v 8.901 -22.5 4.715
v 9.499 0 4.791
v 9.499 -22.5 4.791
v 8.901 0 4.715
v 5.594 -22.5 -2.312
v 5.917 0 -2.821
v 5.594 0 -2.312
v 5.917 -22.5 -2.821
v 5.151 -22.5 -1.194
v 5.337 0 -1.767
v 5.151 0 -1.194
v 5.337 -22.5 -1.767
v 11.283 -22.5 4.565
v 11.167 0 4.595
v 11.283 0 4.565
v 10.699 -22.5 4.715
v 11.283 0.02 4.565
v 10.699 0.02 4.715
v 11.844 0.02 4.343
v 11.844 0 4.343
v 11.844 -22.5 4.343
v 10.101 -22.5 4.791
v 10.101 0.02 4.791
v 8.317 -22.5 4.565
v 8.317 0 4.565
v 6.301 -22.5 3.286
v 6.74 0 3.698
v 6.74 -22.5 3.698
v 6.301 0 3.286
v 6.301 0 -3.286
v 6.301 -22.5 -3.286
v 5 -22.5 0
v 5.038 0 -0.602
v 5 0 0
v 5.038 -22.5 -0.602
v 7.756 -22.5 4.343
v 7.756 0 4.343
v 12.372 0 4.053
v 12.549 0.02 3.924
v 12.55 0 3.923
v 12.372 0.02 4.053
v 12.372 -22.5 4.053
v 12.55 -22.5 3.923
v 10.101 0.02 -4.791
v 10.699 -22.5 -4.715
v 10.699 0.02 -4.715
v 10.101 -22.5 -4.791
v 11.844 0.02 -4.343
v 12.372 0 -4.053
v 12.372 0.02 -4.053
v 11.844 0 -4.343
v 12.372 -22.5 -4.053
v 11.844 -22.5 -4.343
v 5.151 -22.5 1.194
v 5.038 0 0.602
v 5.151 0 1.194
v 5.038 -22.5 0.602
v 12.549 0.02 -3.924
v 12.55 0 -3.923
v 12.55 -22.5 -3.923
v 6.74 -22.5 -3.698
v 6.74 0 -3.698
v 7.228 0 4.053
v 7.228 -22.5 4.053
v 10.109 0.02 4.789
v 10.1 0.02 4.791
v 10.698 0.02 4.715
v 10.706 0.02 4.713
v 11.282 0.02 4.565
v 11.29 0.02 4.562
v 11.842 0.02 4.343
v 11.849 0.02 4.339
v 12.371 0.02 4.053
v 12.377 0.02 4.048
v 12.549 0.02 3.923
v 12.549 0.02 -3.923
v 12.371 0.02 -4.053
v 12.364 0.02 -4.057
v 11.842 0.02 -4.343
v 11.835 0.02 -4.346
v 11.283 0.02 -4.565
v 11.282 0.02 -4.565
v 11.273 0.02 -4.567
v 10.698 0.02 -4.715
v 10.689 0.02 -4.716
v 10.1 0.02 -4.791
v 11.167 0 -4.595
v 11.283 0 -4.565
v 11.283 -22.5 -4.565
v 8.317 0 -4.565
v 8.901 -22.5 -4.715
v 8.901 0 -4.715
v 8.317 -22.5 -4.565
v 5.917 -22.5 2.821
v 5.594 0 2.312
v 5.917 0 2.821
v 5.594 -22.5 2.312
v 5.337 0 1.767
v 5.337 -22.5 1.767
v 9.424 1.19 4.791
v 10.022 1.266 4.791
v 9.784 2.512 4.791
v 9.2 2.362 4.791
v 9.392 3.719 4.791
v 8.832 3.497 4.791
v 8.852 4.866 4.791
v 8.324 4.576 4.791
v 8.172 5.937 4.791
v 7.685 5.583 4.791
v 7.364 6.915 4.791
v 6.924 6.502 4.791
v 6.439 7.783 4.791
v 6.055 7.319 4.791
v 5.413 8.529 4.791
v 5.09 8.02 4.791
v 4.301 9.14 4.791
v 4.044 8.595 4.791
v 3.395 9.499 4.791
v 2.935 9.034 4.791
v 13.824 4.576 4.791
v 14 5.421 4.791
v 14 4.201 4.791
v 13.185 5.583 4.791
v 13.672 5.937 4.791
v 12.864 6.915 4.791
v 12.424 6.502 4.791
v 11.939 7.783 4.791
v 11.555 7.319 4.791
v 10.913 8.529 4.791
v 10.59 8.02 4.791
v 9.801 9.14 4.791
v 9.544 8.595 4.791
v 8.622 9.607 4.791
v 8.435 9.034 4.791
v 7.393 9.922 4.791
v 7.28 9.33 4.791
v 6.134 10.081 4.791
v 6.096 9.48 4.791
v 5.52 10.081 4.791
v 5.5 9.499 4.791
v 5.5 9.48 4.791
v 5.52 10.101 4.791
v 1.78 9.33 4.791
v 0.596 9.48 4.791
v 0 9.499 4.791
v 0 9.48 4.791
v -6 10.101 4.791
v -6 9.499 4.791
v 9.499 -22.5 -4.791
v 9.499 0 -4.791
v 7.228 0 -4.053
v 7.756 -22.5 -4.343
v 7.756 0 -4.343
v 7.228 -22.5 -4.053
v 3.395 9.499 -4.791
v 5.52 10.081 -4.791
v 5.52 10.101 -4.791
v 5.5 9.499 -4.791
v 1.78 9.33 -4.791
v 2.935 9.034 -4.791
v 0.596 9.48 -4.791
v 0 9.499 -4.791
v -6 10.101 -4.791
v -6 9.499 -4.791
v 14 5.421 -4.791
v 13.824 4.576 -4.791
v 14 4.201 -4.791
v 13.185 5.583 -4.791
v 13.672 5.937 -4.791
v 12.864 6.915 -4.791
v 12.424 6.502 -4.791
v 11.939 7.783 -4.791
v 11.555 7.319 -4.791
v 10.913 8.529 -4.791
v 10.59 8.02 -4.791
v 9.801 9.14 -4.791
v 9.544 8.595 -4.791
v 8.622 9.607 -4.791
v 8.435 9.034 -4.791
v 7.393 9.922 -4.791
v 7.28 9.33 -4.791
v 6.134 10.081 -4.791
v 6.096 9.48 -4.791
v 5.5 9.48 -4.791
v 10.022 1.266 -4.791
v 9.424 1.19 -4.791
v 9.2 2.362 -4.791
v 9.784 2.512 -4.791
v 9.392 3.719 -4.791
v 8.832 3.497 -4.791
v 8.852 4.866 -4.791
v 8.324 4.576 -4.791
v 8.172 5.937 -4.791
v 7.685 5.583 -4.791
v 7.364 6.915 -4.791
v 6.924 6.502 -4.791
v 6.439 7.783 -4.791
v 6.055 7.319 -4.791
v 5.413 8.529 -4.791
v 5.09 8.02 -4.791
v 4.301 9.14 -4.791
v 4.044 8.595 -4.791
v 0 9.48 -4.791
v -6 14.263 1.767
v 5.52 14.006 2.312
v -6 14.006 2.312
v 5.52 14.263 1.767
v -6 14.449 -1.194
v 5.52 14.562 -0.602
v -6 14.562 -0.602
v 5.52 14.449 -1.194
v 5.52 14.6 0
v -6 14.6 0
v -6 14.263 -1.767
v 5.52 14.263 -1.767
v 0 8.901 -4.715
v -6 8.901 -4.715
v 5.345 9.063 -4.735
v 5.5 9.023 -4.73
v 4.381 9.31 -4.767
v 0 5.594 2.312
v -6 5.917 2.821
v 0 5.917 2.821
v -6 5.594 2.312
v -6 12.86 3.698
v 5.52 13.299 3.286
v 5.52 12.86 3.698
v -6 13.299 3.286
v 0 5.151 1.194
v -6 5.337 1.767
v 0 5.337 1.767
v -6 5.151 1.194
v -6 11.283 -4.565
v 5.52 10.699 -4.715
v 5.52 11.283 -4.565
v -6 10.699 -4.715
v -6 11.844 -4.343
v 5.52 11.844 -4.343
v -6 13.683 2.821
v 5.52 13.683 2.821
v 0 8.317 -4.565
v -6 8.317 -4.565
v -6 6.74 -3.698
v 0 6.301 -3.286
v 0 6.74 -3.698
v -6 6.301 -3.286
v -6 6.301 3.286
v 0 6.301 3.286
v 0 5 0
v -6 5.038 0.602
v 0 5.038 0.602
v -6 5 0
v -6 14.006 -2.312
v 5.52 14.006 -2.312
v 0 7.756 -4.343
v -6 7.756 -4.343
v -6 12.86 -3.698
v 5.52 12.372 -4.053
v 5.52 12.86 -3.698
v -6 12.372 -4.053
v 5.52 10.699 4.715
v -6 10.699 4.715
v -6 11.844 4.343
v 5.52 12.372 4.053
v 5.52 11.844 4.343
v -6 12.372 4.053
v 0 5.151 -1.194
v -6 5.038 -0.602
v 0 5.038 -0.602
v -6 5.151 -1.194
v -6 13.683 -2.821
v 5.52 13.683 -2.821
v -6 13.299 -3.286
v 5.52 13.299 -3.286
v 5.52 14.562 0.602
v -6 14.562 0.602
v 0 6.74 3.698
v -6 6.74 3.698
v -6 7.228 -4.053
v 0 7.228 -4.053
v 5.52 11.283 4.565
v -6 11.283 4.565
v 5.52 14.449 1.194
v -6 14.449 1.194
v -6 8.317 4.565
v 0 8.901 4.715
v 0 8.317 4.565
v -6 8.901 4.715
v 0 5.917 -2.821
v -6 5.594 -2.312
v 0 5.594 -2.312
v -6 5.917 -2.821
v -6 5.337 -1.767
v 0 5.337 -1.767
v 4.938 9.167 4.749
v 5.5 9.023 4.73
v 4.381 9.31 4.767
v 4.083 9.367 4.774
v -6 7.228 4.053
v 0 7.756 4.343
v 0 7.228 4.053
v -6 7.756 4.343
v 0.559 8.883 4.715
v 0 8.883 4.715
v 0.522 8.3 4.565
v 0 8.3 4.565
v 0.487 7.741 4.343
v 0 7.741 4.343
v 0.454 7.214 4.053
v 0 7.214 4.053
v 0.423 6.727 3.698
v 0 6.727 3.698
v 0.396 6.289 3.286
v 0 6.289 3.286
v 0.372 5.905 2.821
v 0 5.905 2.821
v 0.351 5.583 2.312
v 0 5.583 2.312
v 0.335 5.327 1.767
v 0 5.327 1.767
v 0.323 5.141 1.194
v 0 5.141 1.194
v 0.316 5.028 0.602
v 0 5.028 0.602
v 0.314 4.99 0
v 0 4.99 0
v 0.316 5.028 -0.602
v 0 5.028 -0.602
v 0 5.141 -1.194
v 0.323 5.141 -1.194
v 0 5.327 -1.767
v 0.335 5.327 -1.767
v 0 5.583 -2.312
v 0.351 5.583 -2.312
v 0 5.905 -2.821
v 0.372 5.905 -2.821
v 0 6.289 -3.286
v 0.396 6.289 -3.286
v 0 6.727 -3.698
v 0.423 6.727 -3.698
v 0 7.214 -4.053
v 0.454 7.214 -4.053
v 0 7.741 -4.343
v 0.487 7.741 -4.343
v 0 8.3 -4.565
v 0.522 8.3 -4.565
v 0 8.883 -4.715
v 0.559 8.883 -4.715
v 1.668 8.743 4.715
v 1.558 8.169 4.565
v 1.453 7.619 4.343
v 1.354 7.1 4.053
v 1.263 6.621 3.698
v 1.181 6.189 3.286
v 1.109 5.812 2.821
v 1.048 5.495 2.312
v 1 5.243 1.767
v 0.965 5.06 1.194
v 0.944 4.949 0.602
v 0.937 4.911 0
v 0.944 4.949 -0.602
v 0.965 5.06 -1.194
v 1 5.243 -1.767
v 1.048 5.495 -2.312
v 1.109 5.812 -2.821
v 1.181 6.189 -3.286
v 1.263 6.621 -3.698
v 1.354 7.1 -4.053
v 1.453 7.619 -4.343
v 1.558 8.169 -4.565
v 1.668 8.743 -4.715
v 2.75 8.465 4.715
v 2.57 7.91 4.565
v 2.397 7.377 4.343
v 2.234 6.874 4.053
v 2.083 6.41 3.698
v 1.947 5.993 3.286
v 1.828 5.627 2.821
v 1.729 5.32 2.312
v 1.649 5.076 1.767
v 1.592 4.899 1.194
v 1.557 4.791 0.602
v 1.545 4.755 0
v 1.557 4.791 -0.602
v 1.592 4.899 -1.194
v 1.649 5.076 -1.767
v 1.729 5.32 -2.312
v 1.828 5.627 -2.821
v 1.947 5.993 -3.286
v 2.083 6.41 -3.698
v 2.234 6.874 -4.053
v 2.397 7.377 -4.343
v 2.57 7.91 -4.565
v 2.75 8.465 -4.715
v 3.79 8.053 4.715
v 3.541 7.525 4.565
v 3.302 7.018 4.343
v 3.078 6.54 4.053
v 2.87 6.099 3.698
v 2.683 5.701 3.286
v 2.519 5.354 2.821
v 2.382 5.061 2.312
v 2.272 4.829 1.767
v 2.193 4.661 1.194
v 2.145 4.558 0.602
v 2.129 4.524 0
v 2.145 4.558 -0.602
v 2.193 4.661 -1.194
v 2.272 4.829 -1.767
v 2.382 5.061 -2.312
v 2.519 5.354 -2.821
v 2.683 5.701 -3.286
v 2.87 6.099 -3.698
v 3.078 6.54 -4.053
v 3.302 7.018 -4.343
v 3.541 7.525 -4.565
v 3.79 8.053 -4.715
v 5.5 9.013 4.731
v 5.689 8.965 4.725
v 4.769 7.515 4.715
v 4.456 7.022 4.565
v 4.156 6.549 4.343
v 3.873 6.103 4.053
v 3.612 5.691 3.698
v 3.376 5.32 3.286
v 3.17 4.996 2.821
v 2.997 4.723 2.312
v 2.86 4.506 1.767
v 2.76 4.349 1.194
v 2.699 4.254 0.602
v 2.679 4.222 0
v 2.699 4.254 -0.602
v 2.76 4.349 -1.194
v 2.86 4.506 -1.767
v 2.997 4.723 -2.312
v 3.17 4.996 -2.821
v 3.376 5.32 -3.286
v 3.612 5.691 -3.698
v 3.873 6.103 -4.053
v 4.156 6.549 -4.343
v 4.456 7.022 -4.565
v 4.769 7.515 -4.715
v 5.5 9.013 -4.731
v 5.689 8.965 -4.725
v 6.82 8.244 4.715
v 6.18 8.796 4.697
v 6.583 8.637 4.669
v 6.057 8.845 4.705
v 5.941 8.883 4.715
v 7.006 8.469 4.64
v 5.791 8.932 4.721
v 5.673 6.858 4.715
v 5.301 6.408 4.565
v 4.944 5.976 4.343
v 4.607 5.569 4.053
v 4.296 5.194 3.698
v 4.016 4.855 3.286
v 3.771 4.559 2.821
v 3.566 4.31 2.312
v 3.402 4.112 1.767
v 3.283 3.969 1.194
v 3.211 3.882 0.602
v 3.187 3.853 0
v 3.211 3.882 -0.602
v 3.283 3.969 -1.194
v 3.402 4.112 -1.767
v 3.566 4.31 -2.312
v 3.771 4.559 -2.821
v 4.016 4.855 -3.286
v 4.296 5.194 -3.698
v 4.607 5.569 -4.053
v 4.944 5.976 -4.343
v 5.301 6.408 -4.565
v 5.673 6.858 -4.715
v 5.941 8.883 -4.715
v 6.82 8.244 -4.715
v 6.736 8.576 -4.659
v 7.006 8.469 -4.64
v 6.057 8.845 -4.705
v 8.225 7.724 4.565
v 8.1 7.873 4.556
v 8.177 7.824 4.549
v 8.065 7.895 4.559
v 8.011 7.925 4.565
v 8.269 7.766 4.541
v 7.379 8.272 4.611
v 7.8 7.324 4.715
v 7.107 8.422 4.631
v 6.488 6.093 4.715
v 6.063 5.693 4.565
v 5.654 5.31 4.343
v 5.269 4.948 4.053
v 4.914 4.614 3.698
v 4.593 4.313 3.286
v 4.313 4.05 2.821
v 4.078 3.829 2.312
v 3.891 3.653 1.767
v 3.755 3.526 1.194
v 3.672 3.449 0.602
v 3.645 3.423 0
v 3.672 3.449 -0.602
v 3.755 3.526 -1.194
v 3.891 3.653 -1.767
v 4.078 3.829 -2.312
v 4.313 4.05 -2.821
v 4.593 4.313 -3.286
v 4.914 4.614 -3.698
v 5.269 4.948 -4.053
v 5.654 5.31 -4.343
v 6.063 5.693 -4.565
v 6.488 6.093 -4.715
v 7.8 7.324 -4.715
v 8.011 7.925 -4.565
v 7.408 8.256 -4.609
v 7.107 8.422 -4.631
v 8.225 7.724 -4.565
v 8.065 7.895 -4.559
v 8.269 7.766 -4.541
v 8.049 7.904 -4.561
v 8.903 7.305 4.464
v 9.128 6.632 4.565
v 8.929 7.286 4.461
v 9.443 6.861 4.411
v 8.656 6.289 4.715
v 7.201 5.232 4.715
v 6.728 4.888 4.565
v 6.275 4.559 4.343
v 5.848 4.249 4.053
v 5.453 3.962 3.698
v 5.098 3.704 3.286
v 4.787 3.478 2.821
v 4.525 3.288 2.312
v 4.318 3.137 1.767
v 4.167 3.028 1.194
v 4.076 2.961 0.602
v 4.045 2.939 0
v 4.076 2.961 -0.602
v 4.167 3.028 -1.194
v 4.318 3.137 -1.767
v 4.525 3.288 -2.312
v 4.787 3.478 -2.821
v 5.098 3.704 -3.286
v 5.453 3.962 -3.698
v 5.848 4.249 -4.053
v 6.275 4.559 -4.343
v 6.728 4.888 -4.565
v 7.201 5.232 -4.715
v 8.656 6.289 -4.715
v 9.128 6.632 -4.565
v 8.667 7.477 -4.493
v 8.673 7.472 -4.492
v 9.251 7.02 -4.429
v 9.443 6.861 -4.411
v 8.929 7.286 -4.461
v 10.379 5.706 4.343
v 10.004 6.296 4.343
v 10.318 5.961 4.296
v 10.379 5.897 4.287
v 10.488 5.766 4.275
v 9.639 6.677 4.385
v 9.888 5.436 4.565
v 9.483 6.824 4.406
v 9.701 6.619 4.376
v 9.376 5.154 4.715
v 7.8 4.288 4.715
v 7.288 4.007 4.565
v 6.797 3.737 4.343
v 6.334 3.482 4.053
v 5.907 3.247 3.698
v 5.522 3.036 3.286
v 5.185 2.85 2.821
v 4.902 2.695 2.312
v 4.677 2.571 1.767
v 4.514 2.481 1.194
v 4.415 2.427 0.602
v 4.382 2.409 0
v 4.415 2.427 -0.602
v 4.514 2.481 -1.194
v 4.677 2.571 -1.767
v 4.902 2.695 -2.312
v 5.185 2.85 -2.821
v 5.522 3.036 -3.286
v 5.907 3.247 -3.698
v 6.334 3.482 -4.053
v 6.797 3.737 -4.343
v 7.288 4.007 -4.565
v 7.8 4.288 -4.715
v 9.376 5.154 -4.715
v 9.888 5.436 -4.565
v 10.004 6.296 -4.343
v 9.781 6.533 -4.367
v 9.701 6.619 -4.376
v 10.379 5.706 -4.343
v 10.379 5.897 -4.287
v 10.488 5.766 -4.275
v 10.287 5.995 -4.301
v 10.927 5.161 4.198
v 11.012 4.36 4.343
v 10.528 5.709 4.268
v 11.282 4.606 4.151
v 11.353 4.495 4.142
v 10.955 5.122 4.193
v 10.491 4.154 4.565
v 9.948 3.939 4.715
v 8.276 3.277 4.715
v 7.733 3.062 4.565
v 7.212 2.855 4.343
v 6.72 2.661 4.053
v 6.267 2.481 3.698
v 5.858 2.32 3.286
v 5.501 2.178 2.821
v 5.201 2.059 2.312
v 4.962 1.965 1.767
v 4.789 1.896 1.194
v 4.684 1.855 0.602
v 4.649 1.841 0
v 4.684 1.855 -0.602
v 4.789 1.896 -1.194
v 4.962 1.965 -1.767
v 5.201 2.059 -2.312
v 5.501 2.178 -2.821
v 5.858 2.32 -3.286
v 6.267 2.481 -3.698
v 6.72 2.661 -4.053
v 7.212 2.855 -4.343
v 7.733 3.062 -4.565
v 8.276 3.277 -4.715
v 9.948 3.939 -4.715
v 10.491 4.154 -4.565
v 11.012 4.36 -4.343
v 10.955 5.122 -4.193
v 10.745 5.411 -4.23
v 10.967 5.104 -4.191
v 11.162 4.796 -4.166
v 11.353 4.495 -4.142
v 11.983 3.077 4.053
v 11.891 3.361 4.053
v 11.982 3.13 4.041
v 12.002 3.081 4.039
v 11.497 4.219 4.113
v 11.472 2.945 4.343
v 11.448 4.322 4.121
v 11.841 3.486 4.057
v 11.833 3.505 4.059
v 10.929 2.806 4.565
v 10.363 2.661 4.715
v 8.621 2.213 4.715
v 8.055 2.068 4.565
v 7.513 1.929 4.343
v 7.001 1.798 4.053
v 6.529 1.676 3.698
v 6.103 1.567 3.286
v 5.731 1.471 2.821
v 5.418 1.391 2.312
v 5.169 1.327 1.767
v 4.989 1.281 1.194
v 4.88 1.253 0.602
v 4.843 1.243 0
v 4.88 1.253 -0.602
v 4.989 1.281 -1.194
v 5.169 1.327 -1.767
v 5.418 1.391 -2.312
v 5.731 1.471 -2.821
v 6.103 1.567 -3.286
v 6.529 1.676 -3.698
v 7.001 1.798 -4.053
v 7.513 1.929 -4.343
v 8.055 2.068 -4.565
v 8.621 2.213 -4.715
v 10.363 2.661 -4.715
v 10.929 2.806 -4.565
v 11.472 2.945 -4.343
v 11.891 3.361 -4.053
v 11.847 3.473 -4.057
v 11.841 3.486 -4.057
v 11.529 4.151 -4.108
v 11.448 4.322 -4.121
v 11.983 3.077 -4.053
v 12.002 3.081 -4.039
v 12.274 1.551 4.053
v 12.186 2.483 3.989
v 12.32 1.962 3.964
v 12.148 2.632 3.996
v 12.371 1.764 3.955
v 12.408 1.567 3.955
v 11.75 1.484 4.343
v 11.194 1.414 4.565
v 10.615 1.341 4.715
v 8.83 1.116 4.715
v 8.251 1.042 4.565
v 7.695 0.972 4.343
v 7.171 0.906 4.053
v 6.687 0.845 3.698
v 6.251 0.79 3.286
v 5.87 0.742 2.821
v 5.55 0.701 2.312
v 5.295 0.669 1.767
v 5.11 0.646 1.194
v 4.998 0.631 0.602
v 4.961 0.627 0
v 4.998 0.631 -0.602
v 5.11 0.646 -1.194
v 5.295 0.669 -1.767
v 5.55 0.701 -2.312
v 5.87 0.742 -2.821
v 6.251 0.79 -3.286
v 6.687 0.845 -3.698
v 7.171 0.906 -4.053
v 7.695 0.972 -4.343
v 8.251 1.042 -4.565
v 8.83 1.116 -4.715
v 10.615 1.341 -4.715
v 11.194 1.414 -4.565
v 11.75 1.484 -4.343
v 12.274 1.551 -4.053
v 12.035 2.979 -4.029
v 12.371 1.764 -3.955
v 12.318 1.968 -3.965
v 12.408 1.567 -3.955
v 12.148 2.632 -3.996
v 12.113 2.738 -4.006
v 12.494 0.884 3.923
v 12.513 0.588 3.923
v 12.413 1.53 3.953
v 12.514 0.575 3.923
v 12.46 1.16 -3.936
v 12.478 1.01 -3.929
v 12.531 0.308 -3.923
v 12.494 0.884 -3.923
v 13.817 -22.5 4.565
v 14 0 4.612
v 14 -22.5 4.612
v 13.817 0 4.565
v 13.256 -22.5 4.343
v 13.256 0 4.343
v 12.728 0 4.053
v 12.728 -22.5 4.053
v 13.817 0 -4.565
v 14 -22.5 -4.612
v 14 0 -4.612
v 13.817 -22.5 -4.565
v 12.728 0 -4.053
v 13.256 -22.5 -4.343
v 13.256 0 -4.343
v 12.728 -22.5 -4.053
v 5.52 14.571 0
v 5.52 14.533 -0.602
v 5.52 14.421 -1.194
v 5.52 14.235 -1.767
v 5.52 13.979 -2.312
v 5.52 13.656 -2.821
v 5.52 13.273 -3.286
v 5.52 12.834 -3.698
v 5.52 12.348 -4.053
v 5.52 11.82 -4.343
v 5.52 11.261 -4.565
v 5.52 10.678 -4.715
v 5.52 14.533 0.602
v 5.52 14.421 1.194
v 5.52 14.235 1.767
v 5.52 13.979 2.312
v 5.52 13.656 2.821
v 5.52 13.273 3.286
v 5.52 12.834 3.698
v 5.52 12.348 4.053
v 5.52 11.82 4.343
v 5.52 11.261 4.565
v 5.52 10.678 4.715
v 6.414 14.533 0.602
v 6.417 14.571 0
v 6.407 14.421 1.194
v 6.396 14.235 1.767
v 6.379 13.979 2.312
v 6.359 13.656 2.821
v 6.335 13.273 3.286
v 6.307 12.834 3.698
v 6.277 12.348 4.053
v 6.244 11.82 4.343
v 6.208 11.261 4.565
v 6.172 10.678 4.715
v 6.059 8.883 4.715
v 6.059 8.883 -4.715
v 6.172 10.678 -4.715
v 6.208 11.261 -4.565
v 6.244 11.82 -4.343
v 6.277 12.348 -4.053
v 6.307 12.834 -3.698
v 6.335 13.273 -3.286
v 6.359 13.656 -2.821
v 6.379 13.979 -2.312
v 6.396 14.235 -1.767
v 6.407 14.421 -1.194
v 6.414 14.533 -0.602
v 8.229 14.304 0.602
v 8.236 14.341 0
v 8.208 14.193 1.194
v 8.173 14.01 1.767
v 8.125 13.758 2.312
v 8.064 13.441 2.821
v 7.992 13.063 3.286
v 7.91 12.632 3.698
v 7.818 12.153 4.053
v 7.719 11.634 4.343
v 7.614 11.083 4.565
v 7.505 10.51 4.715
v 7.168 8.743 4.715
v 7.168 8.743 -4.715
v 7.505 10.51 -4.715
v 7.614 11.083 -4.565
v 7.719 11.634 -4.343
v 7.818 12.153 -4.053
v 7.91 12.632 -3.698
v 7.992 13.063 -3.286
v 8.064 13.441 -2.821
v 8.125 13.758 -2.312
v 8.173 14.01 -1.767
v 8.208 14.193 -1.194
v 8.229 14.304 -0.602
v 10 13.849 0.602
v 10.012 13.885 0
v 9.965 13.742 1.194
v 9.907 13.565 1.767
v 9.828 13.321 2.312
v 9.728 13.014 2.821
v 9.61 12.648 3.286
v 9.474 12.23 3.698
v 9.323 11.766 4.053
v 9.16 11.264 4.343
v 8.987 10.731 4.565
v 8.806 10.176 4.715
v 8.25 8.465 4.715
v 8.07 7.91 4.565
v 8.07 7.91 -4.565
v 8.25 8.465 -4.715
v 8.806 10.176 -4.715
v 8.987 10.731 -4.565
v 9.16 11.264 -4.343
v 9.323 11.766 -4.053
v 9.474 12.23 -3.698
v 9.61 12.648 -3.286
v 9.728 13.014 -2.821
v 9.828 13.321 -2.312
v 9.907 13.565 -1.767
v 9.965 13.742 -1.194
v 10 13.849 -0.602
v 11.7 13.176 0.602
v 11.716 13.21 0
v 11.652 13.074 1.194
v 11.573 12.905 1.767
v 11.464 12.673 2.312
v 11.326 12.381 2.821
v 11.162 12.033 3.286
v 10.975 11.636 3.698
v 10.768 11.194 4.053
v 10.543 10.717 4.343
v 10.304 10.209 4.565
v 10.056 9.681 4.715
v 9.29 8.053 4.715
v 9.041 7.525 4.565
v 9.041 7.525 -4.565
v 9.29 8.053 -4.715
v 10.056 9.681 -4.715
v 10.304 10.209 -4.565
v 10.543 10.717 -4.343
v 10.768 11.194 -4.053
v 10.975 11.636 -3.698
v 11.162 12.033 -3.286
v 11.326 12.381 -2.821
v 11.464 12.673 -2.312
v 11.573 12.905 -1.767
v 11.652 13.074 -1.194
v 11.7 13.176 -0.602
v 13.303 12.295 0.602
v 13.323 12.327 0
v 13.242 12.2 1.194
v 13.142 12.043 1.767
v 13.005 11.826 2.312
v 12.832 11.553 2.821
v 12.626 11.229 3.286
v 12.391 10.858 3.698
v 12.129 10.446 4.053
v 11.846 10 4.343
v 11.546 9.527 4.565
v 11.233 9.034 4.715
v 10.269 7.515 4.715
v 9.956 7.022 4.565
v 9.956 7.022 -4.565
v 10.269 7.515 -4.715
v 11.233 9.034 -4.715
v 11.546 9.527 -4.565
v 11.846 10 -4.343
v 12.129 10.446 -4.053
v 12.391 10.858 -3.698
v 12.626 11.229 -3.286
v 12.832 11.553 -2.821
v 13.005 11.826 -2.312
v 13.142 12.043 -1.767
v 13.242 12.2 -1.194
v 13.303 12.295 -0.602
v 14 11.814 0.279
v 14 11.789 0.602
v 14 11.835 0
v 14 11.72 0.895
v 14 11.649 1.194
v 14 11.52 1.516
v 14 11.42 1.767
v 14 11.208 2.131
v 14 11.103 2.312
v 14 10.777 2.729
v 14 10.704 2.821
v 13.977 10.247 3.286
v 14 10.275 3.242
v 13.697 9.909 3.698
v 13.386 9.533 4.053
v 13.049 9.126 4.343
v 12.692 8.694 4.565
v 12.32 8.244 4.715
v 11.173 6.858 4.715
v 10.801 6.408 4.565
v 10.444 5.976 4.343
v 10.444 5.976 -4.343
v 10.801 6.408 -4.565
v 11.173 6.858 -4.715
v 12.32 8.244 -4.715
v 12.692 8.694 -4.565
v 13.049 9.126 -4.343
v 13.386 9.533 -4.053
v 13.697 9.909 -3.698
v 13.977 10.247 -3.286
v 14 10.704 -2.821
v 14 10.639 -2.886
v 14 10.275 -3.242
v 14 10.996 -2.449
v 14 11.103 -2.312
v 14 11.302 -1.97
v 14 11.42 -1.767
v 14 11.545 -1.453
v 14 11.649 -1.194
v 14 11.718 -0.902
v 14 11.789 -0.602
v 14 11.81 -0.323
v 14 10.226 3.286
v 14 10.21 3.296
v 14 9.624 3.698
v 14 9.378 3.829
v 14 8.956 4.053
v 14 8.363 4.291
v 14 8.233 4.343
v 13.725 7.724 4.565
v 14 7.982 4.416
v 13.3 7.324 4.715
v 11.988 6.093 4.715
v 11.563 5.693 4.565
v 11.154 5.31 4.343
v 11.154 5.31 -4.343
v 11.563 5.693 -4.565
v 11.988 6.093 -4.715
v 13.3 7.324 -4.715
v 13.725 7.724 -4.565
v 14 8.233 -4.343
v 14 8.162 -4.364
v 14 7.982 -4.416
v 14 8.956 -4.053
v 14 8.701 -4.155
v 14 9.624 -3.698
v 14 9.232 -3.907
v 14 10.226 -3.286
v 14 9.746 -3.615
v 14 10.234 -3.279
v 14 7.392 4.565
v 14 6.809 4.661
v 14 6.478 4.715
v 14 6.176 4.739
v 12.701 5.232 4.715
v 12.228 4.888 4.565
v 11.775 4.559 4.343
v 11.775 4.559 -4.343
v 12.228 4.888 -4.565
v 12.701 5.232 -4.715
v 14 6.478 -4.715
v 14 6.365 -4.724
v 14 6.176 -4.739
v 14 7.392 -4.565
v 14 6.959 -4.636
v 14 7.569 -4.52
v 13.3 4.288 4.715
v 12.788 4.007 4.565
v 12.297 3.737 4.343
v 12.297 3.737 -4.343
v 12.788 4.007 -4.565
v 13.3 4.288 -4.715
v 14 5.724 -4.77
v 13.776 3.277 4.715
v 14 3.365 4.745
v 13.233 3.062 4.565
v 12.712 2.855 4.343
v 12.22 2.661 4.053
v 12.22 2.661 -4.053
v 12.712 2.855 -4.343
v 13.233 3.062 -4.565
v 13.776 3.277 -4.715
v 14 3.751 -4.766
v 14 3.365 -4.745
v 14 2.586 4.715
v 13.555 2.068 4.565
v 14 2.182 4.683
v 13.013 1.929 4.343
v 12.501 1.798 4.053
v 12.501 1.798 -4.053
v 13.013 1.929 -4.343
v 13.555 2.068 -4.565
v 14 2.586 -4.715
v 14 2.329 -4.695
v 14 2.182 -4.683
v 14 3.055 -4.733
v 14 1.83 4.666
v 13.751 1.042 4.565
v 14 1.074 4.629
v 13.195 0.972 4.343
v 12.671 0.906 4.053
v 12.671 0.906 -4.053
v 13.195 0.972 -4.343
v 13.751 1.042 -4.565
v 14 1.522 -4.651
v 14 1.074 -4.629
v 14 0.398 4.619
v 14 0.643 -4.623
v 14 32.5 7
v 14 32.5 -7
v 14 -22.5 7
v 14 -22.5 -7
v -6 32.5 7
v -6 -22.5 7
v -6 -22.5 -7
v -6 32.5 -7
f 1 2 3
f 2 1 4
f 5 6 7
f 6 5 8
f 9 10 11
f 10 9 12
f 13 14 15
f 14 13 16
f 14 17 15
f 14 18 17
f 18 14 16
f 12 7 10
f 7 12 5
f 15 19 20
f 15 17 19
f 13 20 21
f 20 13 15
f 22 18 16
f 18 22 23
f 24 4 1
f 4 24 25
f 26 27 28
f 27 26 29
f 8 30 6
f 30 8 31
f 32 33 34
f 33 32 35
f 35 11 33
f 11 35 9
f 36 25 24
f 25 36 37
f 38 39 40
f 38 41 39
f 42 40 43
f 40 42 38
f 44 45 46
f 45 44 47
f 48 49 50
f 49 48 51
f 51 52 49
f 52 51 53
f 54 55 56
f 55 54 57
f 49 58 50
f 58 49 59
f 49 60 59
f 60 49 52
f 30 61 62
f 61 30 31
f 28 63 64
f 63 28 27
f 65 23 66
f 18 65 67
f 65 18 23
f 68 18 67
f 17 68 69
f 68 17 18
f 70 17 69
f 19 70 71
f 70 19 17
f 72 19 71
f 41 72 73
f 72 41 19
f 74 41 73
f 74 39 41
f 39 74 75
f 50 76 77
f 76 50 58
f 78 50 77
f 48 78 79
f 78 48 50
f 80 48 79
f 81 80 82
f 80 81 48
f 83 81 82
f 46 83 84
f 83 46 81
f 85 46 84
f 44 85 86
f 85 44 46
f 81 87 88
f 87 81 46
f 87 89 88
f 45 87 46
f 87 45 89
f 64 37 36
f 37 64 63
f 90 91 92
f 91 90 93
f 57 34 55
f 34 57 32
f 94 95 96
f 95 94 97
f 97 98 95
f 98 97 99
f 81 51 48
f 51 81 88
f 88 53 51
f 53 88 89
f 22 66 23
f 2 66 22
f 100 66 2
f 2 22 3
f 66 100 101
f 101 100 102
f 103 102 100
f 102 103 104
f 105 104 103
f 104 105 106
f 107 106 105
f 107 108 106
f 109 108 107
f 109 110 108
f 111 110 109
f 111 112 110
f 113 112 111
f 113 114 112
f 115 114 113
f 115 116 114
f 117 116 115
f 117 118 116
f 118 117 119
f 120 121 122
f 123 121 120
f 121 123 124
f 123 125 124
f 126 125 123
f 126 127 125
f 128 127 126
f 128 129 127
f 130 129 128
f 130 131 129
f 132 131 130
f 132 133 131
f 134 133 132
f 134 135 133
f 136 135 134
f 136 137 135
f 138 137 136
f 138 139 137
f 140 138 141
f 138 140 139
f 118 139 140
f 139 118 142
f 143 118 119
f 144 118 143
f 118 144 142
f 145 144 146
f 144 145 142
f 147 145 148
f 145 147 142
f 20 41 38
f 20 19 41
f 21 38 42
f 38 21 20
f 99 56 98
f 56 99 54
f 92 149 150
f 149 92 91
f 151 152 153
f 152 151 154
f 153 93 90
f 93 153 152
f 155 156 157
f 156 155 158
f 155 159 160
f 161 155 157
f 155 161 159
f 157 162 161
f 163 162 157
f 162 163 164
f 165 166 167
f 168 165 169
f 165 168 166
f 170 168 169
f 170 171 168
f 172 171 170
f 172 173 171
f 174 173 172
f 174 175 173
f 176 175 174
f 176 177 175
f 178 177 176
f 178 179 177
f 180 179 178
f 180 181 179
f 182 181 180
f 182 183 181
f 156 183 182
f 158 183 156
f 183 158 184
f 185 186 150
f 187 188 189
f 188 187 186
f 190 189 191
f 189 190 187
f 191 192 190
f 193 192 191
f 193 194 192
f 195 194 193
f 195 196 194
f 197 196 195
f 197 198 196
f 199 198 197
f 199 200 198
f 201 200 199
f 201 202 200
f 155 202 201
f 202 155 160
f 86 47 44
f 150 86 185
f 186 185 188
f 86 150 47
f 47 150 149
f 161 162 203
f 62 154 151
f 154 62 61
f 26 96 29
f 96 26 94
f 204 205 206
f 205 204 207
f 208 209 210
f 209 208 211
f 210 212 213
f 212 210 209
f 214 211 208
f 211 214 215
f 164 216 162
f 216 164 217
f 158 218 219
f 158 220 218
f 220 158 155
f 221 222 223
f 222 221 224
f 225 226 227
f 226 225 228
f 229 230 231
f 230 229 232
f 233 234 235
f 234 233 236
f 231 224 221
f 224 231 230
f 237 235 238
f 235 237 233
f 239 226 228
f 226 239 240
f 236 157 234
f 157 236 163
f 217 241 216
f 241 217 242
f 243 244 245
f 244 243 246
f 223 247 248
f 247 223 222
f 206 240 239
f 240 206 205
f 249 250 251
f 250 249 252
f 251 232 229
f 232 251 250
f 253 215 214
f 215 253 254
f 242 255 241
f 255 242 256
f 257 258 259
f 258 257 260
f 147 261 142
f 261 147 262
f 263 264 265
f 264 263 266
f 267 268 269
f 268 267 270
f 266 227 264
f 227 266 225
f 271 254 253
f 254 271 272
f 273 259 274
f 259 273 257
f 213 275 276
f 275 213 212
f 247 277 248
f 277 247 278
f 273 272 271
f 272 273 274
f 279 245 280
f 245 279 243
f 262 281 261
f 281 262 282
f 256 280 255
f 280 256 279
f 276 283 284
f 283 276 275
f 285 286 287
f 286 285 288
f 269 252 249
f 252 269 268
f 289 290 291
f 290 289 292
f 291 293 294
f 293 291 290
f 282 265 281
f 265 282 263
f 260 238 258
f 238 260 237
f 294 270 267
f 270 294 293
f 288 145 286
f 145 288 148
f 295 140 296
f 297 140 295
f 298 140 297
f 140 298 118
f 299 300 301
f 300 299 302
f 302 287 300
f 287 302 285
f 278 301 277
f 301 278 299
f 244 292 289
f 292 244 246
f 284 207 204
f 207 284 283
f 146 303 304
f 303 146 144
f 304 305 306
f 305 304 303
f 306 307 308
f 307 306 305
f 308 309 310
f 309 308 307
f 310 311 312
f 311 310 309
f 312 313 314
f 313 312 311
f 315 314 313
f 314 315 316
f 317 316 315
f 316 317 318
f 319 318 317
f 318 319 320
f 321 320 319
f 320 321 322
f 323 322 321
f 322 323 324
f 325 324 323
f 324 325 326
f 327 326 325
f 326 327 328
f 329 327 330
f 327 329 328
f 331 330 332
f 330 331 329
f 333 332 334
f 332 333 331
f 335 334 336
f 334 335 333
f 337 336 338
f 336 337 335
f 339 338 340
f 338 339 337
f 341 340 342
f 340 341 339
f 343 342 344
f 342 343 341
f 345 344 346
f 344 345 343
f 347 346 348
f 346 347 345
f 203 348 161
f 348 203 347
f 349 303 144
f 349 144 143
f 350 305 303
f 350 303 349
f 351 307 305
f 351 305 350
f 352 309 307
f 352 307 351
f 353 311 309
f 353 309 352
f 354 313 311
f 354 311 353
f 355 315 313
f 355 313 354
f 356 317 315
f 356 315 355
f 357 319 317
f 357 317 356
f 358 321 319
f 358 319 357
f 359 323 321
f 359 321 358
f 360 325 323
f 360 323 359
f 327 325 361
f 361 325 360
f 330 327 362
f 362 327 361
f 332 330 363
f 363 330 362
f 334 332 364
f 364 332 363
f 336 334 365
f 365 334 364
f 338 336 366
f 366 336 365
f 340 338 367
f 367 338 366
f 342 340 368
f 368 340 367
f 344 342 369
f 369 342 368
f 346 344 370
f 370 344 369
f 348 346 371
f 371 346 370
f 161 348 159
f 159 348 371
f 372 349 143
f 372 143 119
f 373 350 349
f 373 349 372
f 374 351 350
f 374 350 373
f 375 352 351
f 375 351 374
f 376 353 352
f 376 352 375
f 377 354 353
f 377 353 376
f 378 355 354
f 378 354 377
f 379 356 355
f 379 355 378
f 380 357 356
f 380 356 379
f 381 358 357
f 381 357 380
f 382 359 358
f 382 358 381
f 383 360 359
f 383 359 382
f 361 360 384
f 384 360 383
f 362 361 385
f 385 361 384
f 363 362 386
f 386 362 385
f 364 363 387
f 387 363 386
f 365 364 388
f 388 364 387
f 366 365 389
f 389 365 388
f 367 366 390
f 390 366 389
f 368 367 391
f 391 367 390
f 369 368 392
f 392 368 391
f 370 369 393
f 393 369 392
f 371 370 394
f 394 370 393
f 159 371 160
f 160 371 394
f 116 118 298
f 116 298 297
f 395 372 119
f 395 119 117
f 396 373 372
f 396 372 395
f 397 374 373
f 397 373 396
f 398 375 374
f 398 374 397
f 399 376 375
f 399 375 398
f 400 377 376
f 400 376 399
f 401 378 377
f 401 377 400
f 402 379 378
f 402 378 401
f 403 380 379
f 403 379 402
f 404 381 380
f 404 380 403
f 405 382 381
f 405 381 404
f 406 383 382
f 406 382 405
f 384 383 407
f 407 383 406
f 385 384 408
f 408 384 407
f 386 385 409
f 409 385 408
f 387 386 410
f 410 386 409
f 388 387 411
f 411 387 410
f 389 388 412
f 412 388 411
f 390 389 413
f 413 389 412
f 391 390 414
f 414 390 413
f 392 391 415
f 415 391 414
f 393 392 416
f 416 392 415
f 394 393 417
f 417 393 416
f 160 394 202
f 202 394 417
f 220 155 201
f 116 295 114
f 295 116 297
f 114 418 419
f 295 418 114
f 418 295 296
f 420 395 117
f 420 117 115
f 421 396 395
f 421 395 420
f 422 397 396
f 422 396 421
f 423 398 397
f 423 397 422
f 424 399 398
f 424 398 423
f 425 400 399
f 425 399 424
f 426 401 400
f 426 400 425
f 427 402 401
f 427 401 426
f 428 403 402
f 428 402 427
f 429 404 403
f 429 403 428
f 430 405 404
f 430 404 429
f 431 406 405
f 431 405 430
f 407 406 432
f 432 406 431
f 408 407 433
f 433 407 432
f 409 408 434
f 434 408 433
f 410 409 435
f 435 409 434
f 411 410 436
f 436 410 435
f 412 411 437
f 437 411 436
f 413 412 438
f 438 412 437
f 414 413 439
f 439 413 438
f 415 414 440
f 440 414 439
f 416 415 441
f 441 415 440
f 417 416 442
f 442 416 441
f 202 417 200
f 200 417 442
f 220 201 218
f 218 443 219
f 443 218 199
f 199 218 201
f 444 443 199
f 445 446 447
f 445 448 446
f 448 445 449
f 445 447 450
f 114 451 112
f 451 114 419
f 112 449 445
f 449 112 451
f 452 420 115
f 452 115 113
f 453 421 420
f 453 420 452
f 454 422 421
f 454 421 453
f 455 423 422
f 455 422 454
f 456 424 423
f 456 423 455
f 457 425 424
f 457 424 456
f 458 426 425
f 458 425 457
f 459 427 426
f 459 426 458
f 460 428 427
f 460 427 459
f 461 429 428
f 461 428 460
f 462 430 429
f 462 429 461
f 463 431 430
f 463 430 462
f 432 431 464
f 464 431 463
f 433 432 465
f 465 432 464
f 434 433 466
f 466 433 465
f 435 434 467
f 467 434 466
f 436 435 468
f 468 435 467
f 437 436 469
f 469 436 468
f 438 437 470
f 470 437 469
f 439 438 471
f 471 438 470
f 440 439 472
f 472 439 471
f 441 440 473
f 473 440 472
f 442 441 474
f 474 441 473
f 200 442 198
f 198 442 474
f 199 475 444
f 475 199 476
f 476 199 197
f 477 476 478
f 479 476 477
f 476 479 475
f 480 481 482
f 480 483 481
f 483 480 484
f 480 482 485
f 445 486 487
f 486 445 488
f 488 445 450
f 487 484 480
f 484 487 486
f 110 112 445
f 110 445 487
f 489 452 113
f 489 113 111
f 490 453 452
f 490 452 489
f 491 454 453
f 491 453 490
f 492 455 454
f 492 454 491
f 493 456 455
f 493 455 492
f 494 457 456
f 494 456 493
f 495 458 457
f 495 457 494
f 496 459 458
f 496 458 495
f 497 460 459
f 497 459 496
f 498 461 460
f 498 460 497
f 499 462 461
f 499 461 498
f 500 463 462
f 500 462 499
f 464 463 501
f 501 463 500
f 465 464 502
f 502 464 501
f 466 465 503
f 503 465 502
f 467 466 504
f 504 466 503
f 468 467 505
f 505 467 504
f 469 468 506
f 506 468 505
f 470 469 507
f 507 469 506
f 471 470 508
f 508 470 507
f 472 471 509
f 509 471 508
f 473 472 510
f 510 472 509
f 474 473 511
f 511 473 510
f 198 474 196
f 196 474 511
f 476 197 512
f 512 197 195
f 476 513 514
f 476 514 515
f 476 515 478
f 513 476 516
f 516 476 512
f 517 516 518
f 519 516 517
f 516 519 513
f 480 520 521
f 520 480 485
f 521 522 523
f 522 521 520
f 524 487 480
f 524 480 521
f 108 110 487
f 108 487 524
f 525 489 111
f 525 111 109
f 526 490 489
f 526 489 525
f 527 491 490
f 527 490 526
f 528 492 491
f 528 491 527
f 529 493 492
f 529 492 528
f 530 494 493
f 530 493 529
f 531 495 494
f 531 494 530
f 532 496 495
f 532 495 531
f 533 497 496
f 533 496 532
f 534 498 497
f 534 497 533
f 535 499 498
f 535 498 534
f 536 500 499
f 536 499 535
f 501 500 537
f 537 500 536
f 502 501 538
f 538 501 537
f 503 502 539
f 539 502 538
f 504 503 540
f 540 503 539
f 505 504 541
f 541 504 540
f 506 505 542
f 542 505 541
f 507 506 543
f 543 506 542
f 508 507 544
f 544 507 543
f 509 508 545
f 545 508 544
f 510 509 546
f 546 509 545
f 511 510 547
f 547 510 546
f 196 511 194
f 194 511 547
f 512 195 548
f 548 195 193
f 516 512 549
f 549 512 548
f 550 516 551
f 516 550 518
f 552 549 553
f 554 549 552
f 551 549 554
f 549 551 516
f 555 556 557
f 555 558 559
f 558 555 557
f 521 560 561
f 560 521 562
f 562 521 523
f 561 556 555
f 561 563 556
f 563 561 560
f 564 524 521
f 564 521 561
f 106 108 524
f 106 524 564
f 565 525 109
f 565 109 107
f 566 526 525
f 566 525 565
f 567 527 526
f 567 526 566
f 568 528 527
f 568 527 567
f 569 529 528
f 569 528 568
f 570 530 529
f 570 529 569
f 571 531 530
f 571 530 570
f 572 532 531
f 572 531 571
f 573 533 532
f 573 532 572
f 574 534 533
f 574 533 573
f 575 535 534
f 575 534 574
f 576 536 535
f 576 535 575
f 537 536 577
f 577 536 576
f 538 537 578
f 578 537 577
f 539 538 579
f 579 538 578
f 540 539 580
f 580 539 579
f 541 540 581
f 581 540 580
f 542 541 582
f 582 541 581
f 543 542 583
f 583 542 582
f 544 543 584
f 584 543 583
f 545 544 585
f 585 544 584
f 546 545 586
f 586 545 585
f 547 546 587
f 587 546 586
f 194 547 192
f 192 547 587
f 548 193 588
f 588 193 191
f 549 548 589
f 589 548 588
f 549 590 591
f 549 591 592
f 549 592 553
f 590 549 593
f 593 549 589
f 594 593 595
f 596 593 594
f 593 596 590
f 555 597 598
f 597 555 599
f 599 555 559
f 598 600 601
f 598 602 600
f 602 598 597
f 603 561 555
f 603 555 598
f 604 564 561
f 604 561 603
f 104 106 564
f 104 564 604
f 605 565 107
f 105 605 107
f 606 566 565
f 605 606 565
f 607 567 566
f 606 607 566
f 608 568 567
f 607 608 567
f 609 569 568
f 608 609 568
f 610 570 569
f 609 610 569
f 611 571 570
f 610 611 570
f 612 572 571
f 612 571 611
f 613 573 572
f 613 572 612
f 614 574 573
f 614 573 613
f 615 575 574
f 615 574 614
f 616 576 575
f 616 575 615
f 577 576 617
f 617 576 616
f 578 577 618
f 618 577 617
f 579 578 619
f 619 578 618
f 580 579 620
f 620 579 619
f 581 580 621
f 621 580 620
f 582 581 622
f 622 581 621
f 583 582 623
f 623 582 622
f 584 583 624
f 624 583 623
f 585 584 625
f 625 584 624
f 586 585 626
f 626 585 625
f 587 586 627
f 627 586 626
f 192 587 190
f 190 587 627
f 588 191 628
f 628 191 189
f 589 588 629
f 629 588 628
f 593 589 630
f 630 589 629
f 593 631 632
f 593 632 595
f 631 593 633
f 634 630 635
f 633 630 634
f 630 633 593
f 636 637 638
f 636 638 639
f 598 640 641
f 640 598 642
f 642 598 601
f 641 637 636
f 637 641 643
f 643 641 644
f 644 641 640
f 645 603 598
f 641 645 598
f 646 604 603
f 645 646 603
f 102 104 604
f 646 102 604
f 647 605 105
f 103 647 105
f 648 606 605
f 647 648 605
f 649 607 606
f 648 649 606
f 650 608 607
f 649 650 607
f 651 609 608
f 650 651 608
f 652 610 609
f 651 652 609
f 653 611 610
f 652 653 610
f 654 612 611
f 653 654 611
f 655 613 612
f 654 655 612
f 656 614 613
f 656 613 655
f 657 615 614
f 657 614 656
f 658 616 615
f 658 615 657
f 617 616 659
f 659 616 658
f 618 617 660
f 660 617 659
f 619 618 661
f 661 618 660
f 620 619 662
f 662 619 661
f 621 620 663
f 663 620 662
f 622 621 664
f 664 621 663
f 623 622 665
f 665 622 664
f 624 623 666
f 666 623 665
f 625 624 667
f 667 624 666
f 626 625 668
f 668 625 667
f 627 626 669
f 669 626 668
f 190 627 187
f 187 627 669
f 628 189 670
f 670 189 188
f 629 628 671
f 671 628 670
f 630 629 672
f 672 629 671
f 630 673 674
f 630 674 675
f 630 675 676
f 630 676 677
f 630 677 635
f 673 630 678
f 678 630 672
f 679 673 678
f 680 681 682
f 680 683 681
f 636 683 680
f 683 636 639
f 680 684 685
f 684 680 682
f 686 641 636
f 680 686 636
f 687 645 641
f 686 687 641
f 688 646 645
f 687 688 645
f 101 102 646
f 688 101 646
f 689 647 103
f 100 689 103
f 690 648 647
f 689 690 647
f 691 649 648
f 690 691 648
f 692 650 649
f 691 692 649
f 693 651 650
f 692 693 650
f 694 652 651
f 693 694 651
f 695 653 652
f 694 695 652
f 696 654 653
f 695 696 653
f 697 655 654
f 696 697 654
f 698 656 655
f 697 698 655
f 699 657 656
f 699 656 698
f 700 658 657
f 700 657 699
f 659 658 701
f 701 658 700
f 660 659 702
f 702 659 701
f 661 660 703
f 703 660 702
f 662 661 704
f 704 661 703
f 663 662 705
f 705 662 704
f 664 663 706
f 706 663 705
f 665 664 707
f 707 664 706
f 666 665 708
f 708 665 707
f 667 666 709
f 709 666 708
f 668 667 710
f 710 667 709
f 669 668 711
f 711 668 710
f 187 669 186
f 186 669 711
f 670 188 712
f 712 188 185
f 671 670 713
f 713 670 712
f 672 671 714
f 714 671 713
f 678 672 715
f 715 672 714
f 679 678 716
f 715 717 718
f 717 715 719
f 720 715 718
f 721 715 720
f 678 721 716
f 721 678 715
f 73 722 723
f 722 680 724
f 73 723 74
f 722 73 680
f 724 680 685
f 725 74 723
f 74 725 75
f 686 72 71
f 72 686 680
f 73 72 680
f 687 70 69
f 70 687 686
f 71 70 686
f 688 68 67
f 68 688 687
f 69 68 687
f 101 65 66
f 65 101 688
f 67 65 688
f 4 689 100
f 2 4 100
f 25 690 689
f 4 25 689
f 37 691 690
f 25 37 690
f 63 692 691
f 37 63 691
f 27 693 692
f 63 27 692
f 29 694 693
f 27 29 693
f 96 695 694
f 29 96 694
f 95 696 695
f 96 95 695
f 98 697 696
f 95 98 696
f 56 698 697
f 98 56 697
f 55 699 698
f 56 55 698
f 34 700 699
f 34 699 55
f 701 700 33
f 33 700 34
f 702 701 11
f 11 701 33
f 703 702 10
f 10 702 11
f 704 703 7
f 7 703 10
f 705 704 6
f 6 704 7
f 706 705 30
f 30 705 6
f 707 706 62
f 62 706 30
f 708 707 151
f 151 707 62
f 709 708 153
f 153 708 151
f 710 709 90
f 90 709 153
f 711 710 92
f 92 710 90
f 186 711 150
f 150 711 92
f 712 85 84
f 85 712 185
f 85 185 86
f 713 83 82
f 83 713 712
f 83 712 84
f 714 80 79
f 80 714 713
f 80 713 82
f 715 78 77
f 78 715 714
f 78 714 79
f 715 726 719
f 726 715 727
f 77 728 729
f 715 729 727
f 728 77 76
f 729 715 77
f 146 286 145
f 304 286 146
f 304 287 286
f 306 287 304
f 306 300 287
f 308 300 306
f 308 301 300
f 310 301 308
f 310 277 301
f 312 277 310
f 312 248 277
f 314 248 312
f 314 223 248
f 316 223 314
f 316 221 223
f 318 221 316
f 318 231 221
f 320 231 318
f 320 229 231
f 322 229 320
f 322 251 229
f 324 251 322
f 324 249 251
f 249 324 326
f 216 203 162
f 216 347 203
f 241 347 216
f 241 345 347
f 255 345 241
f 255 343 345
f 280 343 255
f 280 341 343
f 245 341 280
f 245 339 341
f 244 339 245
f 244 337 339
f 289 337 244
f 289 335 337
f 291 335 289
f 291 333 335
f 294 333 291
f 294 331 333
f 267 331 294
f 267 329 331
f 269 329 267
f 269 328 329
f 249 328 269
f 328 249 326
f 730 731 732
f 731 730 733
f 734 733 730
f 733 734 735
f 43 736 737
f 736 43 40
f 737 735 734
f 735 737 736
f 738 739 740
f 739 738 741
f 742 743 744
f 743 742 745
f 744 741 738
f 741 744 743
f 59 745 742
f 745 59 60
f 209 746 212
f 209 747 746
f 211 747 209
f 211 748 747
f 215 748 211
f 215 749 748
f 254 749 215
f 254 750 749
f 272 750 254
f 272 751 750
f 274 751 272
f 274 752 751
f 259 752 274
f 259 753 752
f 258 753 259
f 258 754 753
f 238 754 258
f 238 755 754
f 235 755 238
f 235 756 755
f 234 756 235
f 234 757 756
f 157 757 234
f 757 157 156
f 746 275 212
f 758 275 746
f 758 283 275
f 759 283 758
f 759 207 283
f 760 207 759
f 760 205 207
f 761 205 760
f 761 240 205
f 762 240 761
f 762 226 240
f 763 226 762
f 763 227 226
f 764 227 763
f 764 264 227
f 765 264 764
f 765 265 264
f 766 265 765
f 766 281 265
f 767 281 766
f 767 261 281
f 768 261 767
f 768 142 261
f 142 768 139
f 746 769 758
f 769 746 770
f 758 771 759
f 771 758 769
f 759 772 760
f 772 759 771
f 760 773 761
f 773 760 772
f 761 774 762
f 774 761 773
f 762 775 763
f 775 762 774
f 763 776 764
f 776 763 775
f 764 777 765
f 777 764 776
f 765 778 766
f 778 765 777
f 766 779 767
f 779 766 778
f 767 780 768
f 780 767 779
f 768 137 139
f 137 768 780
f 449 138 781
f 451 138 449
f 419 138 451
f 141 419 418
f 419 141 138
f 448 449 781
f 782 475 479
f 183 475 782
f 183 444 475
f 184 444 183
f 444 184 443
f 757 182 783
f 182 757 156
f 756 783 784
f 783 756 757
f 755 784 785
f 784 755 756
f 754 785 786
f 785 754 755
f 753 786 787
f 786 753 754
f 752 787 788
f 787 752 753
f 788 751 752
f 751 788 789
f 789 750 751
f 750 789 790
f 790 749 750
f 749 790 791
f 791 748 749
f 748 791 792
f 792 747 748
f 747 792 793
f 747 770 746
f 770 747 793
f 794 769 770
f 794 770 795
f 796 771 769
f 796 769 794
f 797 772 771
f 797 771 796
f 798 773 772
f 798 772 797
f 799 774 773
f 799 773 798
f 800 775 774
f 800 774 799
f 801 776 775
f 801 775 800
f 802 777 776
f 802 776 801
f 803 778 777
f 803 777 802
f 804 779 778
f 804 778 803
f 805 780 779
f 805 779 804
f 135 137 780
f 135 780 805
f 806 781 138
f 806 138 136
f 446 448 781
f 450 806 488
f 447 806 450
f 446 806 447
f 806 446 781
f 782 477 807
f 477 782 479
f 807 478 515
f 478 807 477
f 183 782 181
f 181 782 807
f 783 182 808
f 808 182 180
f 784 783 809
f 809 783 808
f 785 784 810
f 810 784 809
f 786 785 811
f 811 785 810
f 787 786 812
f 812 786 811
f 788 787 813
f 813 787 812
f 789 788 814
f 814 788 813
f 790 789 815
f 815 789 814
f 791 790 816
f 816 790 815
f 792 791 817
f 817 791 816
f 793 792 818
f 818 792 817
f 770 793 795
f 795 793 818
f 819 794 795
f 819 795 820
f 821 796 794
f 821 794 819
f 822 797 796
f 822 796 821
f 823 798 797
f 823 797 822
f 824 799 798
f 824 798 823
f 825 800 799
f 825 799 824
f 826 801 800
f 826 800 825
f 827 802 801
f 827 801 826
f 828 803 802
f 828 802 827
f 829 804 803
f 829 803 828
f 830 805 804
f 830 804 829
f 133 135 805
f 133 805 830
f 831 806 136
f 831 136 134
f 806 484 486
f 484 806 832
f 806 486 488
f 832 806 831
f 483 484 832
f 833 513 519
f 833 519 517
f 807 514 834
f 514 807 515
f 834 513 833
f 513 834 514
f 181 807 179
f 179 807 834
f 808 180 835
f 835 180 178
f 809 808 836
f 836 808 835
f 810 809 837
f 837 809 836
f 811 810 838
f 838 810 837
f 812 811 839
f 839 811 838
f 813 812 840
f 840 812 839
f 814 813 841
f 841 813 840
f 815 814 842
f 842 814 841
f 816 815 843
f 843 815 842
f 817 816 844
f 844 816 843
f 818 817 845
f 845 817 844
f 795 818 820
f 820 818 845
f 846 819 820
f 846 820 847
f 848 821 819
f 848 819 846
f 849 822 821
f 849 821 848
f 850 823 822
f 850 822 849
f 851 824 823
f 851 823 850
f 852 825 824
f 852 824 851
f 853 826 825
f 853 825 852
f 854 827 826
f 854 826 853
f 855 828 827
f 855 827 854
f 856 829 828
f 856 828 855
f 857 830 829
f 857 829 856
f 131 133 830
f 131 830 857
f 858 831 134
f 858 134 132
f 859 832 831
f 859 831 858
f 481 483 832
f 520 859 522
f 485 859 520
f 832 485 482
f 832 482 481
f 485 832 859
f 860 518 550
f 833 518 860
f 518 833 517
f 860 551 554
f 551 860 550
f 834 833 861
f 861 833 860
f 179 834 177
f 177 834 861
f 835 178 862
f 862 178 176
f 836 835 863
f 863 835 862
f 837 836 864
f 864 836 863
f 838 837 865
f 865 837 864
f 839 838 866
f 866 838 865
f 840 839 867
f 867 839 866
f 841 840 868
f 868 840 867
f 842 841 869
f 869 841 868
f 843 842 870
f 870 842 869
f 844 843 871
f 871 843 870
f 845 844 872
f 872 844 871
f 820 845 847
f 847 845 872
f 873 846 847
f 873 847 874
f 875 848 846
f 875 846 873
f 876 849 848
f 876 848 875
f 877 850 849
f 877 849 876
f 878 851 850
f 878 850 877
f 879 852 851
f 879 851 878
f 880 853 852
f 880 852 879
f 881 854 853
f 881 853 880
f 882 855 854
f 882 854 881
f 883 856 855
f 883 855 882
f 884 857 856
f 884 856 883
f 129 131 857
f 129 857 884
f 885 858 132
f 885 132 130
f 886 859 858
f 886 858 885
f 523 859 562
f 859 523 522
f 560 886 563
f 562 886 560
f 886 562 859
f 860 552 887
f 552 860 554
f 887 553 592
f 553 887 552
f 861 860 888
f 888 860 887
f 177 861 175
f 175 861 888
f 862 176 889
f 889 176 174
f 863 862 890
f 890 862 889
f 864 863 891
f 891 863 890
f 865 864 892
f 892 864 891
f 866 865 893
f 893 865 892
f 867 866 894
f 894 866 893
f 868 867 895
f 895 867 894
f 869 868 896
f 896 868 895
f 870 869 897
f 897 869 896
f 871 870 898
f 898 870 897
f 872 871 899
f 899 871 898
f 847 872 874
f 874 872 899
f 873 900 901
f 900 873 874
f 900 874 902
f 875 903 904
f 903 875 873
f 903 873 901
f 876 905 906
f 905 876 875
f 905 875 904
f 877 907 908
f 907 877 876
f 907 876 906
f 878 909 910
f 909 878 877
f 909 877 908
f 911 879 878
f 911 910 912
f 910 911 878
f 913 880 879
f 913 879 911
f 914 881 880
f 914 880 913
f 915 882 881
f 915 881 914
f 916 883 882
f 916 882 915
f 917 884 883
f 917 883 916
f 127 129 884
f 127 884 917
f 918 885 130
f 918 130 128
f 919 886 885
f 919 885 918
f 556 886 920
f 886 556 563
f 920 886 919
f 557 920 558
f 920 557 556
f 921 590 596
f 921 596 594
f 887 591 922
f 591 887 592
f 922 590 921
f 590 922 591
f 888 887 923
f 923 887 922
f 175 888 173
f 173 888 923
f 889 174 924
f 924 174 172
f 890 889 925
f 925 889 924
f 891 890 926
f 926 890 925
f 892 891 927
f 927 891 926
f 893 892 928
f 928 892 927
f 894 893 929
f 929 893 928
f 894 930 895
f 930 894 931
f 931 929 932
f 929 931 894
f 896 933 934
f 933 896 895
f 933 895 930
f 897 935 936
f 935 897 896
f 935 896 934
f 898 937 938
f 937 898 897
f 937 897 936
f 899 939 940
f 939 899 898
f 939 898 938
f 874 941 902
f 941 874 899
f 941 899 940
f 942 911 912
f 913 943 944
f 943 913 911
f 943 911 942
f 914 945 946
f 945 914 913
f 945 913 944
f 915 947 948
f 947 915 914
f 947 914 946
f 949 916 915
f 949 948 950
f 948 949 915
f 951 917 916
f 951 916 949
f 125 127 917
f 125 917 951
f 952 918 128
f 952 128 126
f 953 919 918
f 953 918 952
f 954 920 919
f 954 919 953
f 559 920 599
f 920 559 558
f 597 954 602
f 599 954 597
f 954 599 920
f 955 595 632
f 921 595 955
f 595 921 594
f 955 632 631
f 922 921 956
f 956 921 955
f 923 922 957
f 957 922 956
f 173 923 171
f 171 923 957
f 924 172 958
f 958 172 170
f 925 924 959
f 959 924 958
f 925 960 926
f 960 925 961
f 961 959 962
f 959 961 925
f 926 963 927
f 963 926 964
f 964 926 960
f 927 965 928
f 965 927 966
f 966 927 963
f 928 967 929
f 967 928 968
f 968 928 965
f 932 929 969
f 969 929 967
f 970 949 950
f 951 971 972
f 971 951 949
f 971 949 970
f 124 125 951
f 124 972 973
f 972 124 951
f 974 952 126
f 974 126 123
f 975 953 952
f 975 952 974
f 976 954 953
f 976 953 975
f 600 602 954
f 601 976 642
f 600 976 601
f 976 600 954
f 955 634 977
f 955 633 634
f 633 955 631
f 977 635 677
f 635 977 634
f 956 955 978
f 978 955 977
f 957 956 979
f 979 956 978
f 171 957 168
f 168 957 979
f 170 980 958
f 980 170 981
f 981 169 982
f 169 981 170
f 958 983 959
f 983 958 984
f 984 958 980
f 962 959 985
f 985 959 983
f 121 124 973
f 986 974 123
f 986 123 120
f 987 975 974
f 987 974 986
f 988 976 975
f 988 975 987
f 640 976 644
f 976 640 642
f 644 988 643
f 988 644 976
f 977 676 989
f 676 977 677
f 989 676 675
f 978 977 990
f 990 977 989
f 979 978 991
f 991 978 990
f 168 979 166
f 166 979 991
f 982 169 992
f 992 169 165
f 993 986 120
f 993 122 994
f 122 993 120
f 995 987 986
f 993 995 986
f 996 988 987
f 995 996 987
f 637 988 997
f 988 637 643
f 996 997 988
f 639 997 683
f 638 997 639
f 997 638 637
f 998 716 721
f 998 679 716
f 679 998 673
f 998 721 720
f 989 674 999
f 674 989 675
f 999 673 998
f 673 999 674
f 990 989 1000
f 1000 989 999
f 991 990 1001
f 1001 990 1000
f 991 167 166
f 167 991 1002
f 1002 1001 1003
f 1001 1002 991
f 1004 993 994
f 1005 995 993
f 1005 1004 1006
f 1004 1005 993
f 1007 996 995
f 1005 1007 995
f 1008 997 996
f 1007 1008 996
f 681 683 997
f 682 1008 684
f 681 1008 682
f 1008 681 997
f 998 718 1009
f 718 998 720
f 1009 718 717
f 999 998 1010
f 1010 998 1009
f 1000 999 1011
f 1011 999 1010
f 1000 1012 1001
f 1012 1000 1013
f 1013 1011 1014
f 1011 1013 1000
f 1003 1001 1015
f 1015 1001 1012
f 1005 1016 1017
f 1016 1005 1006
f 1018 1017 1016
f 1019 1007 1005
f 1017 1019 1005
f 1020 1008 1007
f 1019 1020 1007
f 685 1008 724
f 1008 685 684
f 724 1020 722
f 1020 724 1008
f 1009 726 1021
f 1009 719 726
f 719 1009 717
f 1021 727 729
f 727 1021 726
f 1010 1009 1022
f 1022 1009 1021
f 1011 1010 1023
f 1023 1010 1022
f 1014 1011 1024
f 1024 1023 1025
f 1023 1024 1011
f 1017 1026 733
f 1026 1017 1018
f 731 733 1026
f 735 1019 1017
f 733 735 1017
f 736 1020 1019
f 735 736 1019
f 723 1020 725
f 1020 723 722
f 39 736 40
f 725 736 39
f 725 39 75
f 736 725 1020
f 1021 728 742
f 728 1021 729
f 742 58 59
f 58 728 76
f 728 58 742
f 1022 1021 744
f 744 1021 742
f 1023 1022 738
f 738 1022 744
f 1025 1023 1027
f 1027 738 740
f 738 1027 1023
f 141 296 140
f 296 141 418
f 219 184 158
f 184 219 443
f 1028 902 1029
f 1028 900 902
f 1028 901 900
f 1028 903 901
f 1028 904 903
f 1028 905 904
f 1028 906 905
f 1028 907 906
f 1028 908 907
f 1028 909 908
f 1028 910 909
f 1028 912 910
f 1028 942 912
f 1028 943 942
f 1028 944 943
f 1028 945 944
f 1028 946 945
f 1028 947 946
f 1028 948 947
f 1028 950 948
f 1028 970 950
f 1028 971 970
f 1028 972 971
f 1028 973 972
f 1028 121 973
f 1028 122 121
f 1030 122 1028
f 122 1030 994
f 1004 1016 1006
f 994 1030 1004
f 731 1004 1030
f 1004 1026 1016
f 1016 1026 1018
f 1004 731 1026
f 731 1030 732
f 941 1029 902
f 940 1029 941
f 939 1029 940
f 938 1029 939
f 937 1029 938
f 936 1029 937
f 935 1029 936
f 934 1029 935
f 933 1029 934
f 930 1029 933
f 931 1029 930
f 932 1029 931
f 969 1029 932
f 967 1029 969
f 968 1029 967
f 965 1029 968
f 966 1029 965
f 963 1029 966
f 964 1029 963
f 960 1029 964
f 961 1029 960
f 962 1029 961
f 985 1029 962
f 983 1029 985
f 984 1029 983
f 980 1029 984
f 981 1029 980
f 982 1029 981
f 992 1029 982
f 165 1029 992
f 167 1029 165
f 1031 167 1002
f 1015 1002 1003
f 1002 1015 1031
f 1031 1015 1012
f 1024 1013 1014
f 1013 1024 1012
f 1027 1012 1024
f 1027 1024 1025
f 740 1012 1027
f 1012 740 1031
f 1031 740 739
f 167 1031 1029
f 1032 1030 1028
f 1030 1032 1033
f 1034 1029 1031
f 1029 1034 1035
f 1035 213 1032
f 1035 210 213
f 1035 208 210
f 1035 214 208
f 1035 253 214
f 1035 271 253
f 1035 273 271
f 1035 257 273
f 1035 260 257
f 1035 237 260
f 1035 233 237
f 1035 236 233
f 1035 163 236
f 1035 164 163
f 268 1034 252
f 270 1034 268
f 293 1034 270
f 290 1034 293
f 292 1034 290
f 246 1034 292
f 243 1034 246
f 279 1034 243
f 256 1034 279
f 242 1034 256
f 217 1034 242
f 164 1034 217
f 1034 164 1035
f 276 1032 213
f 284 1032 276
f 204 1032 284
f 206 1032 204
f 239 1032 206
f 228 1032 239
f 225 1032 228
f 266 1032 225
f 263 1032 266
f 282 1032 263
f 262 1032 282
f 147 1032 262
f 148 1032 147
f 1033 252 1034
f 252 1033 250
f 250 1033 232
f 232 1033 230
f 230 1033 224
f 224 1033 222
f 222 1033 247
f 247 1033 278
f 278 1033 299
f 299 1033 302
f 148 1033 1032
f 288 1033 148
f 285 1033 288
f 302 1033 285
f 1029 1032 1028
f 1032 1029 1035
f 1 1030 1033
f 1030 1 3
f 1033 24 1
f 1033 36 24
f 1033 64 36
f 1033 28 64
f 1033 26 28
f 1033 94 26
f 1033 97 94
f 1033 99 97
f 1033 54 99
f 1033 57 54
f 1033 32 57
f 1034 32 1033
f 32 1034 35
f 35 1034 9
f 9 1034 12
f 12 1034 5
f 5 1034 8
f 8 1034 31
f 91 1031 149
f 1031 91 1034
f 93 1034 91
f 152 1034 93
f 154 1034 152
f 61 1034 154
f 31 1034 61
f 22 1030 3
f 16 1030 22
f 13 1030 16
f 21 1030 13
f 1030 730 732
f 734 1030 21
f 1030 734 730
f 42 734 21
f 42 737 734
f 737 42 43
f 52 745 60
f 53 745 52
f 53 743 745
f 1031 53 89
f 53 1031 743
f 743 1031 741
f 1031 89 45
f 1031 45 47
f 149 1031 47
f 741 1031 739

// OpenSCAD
$fn=50;

radius = 4.8;
inner_radius = 0;
bend_radius = 5;
angle_1 = 0;
angle_2 = 90;

bar1_length=10;
bar2_length=50;

module dryerBar() {
    union() {
        // lower arm
        rotate([0, 0, angle_1])
            translate([bend_radius + radius, 0.02, 0])
                rotate([90, 0, 0])
                    difference() {
                        cylinder(r=radius, h=bar2_length);
                        translate([0, 0, -1])
                            cylinder(r=inner_radius, h=bar2_length);
                    }

        // upper arm
        rotate([0, 0, angle_2])
            translate([bend_radius + radius, -0.02, 0])
                rotate([-90, 0, 0])
                    difference() {
                        cylinder(r=radius, h=bar1_length);
                        translate([0, 0, -1])
                            cylinder(r=inner_radius, h=bar1_length);
                    }
                    
        // bend
        difference() {
            // torus
            rotate_extrude()
                translate([bend_radius + radius, 0, 0])
                    circle(r=radius);

            // torus cutout
            rotate_extrude()
                translate([bend_radius + radius, 0, 0])
                    circle(r=inner_radius);
            
            // lower cutout
            rotate([0, 0, angle_1])
                translate([-bar2_length * (((angle_2 - angle_1) <= 180)?1:0), -100, -bar2_length])
                    cube([100, 100, 100]);
            
            // upper cutout
            rotate([0, 0, angle_2])
                translate([-bar1_length * (((angle_2 - angle_1) <= 180)?1:0), 0, -bar1_length])
                    cube([100, 100, 100]);
        }
    }
}

difference() {
    translate([4,5,0])
        cube([20,55,14], center=true);
    dryerBar();
    translate([5.5,0,0])
        dryerBar();
}
